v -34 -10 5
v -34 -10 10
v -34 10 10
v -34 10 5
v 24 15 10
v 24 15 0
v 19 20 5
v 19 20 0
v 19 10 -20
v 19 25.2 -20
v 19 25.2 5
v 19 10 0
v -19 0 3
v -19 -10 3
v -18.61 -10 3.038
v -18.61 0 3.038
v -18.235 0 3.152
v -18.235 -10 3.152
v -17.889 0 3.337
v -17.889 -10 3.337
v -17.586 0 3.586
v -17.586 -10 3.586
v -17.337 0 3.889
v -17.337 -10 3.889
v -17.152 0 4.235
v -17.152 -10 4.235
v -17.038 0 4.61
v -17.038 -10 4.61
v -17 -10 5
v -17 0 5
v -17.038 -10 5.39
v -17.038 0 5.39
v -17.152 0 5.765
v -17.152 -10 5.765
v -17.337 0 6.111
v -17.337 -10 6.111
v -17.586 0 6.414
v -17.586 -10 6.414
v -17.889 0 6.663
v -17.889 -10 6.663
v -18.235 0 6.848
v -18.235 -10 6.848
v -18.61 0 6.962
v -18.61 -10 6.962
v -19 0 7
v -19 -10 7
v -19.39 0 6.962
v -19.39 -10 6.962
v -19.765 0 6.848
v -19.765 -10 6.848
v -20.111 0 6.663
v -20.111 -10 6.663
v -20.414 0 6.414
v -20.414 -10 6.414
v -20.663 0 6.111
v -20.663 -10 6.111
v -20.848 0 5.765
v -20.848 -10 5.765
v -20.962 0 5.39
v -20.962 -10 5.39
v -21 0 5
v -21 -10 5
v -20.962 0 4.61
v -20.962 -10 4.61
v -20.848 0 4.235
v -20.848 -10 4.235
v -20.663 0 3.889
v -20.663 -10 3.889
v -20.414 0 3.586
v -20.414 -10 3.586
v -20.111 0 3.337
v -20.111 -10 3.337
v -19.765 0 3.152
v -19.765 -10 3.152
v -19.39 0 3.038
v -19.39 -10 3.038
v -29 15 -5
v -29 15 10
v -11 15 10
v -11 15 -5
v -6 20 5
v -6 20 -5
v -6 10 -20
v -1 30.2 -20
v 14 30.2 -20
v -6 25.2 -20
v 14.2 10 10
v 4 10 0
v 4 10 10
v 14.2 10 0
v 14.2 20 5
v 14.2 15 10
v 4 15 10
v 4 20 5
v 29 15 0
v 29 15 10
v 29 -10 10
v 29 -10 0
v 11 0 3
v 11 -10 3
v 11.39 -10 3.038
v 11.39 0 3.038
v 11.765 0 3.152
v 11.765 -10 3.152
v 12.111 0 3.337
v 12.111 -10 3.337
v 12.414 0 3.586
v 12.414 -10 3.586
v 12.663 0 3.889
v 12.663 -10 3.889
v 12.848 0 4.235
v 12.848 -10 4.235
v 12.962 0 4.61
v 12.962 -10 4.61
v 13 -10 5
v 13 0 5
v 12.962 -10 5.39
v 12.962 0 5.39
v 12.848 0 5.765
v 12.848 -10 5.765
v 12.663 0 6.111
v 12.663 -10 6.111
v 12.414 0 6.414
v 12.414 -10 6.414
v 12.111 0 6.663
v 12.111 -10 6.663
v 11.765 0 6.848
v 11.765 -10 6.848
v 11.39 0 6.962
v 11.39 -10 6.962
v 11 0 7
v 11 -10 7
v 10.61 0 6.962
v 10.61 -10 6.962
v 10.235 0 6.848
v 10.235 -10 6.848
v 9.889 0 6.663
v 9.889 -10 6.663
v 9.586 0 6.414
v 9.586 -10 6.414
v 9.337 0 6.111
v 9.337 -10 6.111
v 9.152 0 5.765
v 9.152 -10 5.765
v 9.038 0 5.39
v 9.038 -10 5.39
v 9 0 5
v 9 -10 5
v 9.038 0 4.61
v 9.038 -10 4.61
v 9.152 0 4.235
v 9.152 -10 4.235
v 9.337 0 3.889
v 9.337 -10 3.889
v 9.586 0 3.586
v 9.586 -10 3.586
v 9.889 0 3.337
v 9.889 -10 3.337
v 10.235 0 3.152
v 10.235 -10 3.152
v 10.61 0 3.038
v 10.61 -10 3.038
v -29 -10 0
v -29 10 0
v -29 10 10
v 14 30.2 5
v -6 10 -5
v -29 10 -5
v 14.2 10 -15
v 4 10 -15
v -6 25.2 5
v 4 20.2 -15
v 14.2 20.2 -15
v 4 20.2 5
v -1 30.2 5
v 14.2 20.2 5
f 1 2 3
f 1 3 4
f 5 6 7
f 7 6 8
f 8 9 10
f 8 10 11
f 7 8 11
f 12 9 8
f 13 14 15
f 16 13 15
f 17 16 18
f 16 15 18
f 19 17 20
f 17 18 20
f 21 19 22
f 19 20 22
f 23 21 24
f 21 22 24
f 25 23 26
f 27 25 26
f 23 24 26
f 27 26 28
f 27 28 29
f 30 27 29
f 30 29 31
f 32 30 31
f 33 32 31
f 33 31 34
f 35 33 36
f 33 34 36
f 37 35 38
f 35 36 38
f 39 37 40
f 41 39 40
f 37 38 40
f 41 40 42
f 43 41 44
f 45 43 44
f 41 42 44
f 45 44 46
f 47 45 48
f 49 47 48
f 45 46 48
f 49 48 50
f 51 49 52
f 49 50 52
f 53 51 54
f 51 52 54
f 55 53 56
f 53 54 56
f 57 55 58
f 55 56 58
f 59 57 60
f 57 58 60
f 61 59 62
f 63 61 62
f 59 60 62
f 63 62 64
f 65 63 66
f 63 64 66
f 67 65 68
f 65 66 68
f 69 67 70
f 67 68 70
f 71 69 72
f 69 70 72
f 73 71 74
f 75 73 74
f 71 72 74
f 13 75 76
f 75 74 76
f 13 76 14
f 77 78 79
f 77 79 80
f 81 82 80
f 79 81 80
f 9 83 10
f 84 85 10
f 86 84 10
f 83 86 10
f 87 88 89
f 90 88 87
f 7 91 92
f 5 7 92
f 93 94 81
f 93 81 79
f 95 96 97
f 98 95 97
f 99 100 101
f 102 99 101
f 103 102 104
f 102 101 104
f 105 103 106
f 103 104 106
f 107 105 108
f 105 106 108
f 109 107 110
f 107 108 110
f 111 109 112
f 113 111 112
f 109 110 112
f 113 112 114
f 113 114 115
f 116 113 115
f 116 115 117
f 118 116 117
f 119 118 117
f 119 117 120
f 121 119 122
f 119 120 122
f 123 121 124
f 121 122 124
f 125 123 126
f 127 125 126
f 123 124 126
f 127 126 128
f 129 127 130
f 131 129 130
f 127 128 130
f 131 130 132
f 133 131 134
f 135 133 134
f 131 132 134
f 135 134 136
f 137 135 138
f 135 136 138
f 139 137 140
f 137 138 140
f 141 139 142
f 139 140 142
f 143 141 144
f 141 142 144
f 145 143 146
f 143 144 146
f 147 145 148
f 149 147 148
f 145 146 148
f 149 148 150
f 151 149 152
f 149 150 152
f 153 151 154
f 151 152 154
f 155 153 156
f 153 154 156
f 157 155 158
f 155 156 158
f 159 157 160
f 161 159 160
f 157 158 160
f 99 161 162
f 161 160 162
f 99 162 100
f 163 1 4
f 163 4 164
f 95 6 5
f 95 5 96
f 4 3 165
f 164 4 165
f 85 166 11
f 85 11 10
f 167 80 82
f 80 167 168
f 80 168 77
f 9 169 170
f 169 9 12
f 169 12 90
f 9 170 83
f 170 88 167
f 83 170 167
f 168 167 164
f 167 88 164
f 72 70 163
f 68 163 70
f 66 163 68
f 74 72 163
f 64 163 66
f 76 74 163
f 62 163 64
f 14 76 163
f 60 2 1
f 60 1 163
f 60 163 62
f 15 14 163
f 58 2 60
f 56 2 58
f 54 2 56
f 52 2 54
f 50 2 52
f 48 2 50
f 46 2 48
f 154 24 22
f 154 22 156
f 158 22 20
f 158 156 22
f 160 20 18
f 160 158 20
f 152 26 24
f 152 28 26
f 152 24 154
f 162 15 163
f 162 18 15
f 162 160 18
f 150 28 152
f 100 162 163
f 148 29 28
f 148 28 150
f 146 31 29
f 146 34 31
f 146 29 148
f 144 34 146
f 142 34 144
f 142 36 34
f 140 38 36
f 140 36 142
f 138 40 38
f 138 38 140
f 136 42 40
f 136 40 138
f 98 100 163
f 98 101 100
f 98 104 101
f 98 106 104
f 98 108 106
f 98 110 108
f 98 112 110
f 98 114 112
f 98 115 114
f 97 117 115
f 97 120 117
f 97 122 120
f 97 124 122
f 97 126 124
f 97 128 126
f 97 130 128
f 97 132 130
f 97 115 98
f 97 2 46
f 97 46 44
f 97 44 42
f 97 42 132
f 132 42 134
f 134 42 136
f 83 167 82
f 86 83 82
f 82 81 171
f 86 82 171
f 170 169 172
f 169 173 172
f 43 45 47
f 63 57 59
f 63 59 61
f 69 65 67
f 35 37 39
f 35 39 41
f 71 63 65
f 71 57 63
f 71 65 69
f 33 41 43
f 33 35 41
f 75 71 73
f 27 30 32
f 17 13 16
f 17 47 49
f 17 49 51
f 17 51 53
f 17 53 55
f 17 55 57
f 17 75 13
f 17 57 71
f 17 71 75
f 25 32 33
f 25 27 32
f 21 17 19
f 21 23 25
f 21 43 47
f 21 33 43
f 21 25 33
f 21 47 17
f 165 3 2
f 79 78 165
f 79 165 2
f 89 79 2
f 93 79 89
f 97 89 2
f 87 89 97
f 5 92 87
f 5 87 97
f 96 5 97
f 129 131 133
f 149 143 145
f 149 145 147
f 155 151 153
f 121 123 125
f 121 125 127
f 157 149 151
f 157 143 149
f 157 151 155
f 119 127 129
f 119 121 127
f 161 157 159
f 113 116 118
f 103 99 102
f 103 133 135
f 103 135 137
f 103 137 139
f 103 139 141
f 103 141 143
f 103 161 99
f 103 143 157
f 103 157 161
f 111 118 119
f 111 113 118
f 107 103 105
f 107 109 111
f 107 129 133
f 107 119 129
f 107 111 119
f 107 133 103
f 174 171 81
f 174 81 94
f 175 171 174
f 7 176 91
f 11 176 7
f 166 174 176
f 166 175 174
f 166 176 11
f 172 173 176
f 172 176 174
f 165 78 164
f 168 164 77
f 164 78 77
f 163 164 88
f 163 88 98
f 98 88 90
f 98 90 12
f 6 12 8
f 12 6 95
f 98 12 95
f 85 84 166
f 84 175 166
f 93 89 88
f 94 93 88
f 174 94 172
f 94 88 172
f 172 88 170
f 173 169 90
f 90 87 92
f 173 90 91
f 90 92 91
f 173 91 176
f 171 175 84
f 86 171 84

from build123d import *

# Parameters (mm, degrees)
SZKIC1_W                        = 58
SZKIC1_H                        = 20
DODANIE_WYCI_GNI_CIE1_DEPTH     = 5
SZKIC2_W                        = 15
SZKIC2_H                        = 5
DODANIE_WYCI_GNI_CIE2_DEPTH     = 58
DODANIE_WYCI_GNI_CIE3_DEPTH     = 20
DODANIE_WYCI_GNI_CIE4_DEPTH     = 10
WYTNIJ_WYCI_GNI_CIE2_DEPTH      = 47.562216442
WYTNIJ_WYCI_GNI_CIE2_DEPTH_BACK = 47.562216442
SZKIC6_W                        = 58
SZKIC6_H                        = 5
DODANIE_WYCI_GNI_CIE5_DEPTH     = 20
SZKIC7_R                        = 2
WYTNIJ_WYCI_GNI_CIE3_DEPTH      = 10
DODANIE_WYCI_GNI_CIE8_DEPTH     = 10
SZKIC11_W                       = 10.2
SZKIC11_H                       = 10.2
DODANIE_WYCI_GNI_CIE9_DEPTH     = 5
SFAZOWANIE2_SIZE                = 5
SFAZOWANIE3_SIZE                = 5
SZKIC12_W                       = 10
SZKIC12_H                       = 20
WYTNIJ_WYCI_GNI_CIE4_DEPTH      = 10


with BuildPart() as part:
    # Szkic1 → Dodanie-wyciągnięcie1 (new body)
    with BuildSketch(Plane.XY):
        Rectangle(SZKIC1_W, SZKIC1_H)
    extrude(amount=DODANIE_WYCI_GNI_CIE1_DEPTH)

    # Szkic2 → Dodanie-wyciągnięcie2 (add)
    with BuildSketch(Plane(origin=(29, 0, 0), x_dir=(0, 0, -1), z_dir=(1, 0, 0))):
        with Locations((-2.5, 12.5)):
            Rectangle(SZKIC2_W, SZKIC2_H)
    extrude(amount=-DODANIE_WYCI_GNI_CIE2_DEPTH)

    # Szkic3 → Dodanie-wyciągnięcie3 (add)
    with BuildSketch(Plane.XZ.offset(10)):
        Polygon((-34, 5), (-29, 0), (-29, 5), (-24, 5), (-29, 10), (-34, 10), align=None)
    extrude(amount=-DODANIE_WYCI_GNI_CIE3_DEPTH)

    # Szkic5 → Dodanie-wyciągnięcie4 (add)
    with BuildSketch(Plane.XY.offset(5)):
        Polygon((14.2, 20.2), (14.2, 10), (19, 10), (19, 30.2), (-6, 30.2), (-6, 10), (4, 10), (4, 20.2), align=None)
    extrude(amount=-DODANIE_WYCI_GNI_CIE4_DEPTH)

    # Szkic5<3> → Wytnij-wyciągnięcie2 (cut, two sides: drawn at the far end of the back side and taken through both)
    with BuildSketch(Plane.XY.offset(5).offset(-WYTNIJ_WYCI_GNI_CIE2_DEPTH_BACK)):
        Polygon((4, 10), (14.2, 10), (14.2, 15), (14.2, 20.2), (4, 20.2), (4, 15), align=None)
    extrude(amount=WYTNIJ_WYCI_GNI_CIE2_DEPTH + WYTNIJ_WYCI_GNI_CIE2_DEPTH_BACK, mode=Mode.SUBTRACT)

    # Szkic6 → Dodanie-wyciągnięcie5 (add)
    with BuildSketch(Plane(origin=(0, 10, 0), x_dir=(1, 0, 0), z_dir=(0, 1, 0))):
        with Locations((0, -7.5)):
            Rectangle(SZKIC6_W, SZKIC6_H)
    extrude(amount=-DODANIE_WYCI_GNI_CIE5_DEPTH)

    # Szkic7 → Wytnij-wyciągnięcie3 (cut)
    with BuildSketch(Plane.XZ.offset(10)):
        with Locations(Location((-19, 5, 0), (0, 0, 270))):
            Circle(SZKIC7_R)
        with Locations(Location((11, 5, 0), (0, 0, 270))):
            Circle(SZKIC7_R)
    extrude(amount=-WYTNIJ_WYCI_GNI_CIE3_DEPTH, mode=Mode.SUBTRACT)

    # Szkic10 → Dodanie-wyciągnięcie8 (add)
    with BuildSketch(Plane(origin=(0, 0, -5), x_dir=(-1, 0, 0), z_dir=(0, 0, -1))):
        Polygon((6, 10), (6, 15), (6, 30.2), (-19, 30.2), (-19, 15), (-29, 15), (-29, 10), (-14.2, 10), (-14.2, 20.2), (-4, 20.2), (-4, 10), align=None)
    extrude(amount=DODANIE_WYCI_GNI_CIE8_DEPTH)

    # Szkic11 → Dodanie-wyciągnięcie9 (add)
    with BuildSketch(Plane(origin=(0, 0, -15), x_dir=(-1, 0, 0), z_dir=(0, 0, -1))):
        with Locations((-9.1, 15.1)):
            Rectangle(SZKIC11_W, SZKIC11_H)
        Polygon((-29, 10), (-14.2, 10), (-14.2, 20.2), (-4, 20.2), (-4, 10), (6, 10), (6, 30.2), (-19, 30.2), (-19, 15), (-29, 15), align=None)
    extrude(amount=DODANIE_WYCI_GNI_CIE9_DEPTH)

    # Sfazowanie2
    sfazowanie2_edges = [part.edges().sort_by_distance(p)[0] for p in [
        (-6, 30.2, -7.5),
        (19, 30.2, -7.5),
    ]]
    chamfer(sfazowanie2_edges, length=SFAZOWANIE2_SIZE)

    # Sfazowanie3
    # the kernel refuses this chamfer: 5 mm, written as the material it adds along each edge
    with BuildSketch(Plane(origin=(1.34158506, 15, 5), x_dir=(0, 0.9996219169112968, -0.027495876610586317), z_dir=(1, 0, 0))) as sfazowanie3_piece_1_section:
        Polygon((SFAZOWANIE3_SIZE * 0.999621916911, SFAZOWANIE3_SIZE * 0.0274958766106), (-SFAZOWANIE3_SIZE * 0.0274958766106, SFAZOWANIE3_SIZE * 0.999621916911), (0, 0), align=None)
    sfazowanie3_piece_1 = extrude(amount=17.65841494, mode=Mode.PRIVATE)
    sfazowanie3_piece_1 = split(sfazowanie3_piece_1, bisect_by=Plane(origin=(4, 16.652020772, 6.643171669), z_dir=(-1, 0, 0)), keep=Keep.TOP, mode=Mode.PRIVATE)
    sfazowanie3_piece_1 = split(sfazowanie3_piece_1, bisect_by=Plane(origin=(2.67079253, 16.652020772, 10), z_dir=(0, 0, -1)), keep=Keep.TOP, mode=Mode.PRIVATE)
    add(sfazowanie3_piece_1)
    with BuildSketch(Plane(origin=(14.2, 15, 5), x_dir=(0, 0.9996219169112968, -0.027495876610586317), z_dir=(1, 0, 0))) as sfazowanie3_piece_2_section:
        Polygon((SFAZOWANIE3_SIZE * 0.999621916911, SFAZOWANIE3_SIZE * 0.0274958766106), (-SFAZOWANIE3_SIZE * 0.0274958766106, SFAZOWANIE3_SIZE * 0.999621916911), (0, 0), align=None)
    sfazowanie3_piece_2 = extrude(amount=4.8, mode=Mode.PRIVATE)
    sfazowanie3_piece_2 = split(sfazowanie3_piece_2, bisect_by=Plane(origin=(16.6, 16.652020772, 10), z_dir=(0, 0, -1)), keep=Keep.TOP, mode=Mode.PRIVATE)
    add(sfazowanie3_piece_2)
    with BuildSketch(Plane(origin=(-6, 15, 5), x_dir=(0, 0.9996219169112968, -0.027495876610586317), z_dir=(1, 0, 0))) as sfazowanie3_piece_3_section:
        Polygon((SFAZOWANIE3_SIZE * 0.999621916911, SFAZOWANIE3_SIZE * 0.0274958766106), (-SFAZOWANIE3_SIZE * 0.0274958766106, SFAZOWANIE3_SIZE * 0.999621916911), (0, 0), align=None)
    sfazowanie3_piece_3 = extrude(amount=10, mode=Mode.PRIVATE)
    sfazowanie3_piece_3 = split(sfazowanie3_piece_3, bisect_by=Plane(origin=(-1, 16.652020772, 10), z_dir=(0, 0, -1)), keep=Keep.TOP, mode=Mode.PRIVATE)
    add(sfazowanie3_piece_3)
    with BuildSketch(Plane(origin=(-6, 15, 5), x_dir=(0, 0.9996219169112968, -0.027495876610586317), z_dir=(1, 0, 0))) as sfazowanie3_piece_4_section:
        Polygon((SFAZOWANIE3_SIZE * 0.999621916911, SFAZOWANIE3_SIZE * 0.0274958766106), (-SFAZOWANIE3_SIZE * 0.0274958766106, SFAZOWANIE3_SIZE * 0.999621916911), (0, 0), align=None)
    sfazowanie3_piece_4 = extrude(amount=22.85841494, mode=Mode.PRIVATE)
    sfazowanie3_piece_4 = split(sfazowanie3_piece_4, bisect_by=Plane(origin=(14.2, 16.652020772, 6.643171669), z_dir=(1, 0, 0)), keep=Keep.TOP, mode=Mode.PRIVATE)
    sfazowanie3_piece_4 = split(sfazowanie3_piece_4, bisect_by=Plane(origin=(15.52920747, 16.652020772, 10), z_dir=(0, 0, -1)), keep=Keep.TOP, mode=Mode.PRIVATE)
    add(sfazowanie3_piece_4)
    with BuildSketch(Plane(origin=(-6, 15, -5), x_dir=(0.027495876610586837, 0.9996219169112968, 0), z_dir=(0, 0, 1))) as sfazowanie3_piece_5:
        Polygon((SFAZOWANIE3_SIZE * 0.999621916911, SFAZOWANIE3_SIZE * 0.0274958766106), (-SFAZOWANIE3_SIZE * 0.0274958766106, SFAZOWANIE3_SIZE * 0.999621916911), (0, 0), align=None)
    extrude(amount=10)
    with BuildSketch(Plane(origin=(19, 15, -20), x_dir=(0.9996219169112968, -0.027495876610586664, 0), z_dir=(0, 0, 1))) as sfazowanie3_piece_6:
        Polygon((SFAZOWANIE3_SIZE * 0.999621916911, SFAZOWANIE3_SIZE * 0.0274958766106), (-SFAZOWANIE3_SIZE * 0.0274958766106, SFAZOWANIE3_SIZE * 0.999621916911), (0, 0), align=None)
    extrude(amount=25)
    with BuildSketch(Plane(origin=(14.2, 15, 5), x_dir=(0, 0.9996219169112968, -0.027495876610586317), z_dir=(1, 0, 0))) as sfazowanie3_piece_7a_section:
        Polygon((SFAZOWANIE3_SIZE * 0.999621916911, SFAZOWANIE3_SIZE * 0.0274958766106), (-SFAZOWANIE3_SIZE * 0.0274958766106, SFAZOWANIE3_SIZE * 0.999621916911), (0, 0), align=None)
    sfazowanie3_piece_7a = extrude(amount=17.65841494, mode=Mode.PRIVATE)
    sfazowanie3_piece_7a = split(sfazowanie3_piece_7a, bisect_by=Plane(origin=(19, 16.652020772, 6.643171669), z_dir=(1, 0, 0)), keep=Keep.TOP, mode=Mode.PRIVATE)
    sfazowanie3_piece_7a = split(sfazowanie3_piece_7a, bisect_by=Plane(origin=(24, 16.652020772, 10), z_dir=(0, 0, -1)), keep=Keep.TOP, mode=Mode.PRIVATE)
    sfazowanie3_piece_7a = split(sfazowanie3_piece_7a, bisect_by=Plane(origin=(29, 16.652020772, 6.643171669), z_dir=(-1, 0, 0)), keep=Keep.TOP, mode=Mode.PRIVATE)
    with BuildSketch(Plane(origin=(19, 15, -20), x_dir=(0.9996219169112968, -0.027495876610586664, 0), z_dir=(0, 0, 1))) as sfazowanie3_piece_7b_section:
        Polygon((SFAZOWANIE3_SIZE * 0.999621916911, SFAZOWANIE3_SIZE * 0.0274958766106), (-SFAZOWANIE3_SIZE * 0.0274958766106, SFAZOWANIE3_SIZE * 0.999621916911), (0, 0), align=None)
    sfazowanie3_piece_7b = extrude(amount=37.85841494, mode=Mode.PRIVATE)
    sfazowanie3_piece_7b = split(sfazowanie3_piece_7b, bisect_by=Plane(origin=(20.648968134, 16.648968134, 5), z_dir=(0, 0, 1)), keep=Keep.TOP, mode=Mode.PRIVATE)
    sfazowanie3_piece_7b = split(sfazowanie3_piece_7b, bisect_by=Plane(origin=(20.648968134, 16.648968134, 10), z_dir=(0, 0, -1)), keep=Keep.TOP, mode=Mode.PRIVATE)
    sfazowanie3_piece_7 = sfazowanie3_piece_7a & sfazowanie3_piece_7b
    add(sfazowanie3_piece_7)
    with BuildSketch(Plane(origin=(-6, 15, -5), x_dir=(0.027495876610586837, 0.9996219169112968, 0), z_dir=(0, 0, 1))) as sfazowanie3_piece_8a_section:
        Polygon((SFAZOWANIE3_SIZE * 0.999621916911, SFAZOWANIE3_SIZE * 0.0274958766106), (-SFAZOWANIE3_SIZE * 0.0274958766106, SFAZOWANIE3_SIZE * 0.999621916911), (0, 0), align=None)
    sfazowanie3_piece_8a = extrude(amount=22.85841494, mode=Mode.PRIVATE)
    sfazowanie3_piece_8a = split(sfazowanie3_piece_8a, bisect_by=Plane(origin=(-7.648968134, 16.648968134, 5), z_dir=(0, 0, 1)), keep=Keep.TOP, mode=Mode.PRIVATE)
    sfazowanie3_piece_8a = split(sfazowanie3_piece_8a, bisect_by=Plane(origin=(-7.648968134, 16.648968134, 10), z_dir=(0, 0, -1)), keep=Keep.TOP, mode=Mode.PRIVATE)
    with BuildSketch(Plane(origin=(-18.85841494, 15, 5), x_dir=(0, 0.9996219169112968, -0.027495876610586317), z_dir=(1, 0, 0))) as sfazowanie3_piece_8b_section:
        Polygon((SFAZOWANIE3_SIZE * 0.999621916911, SFAZOWANIE3_SIZE * 0.0274958766106), (-SFAZOWANIE3_SIZE * 0.0274958766106, SFAZOWANIE3_SIZE * 0.999621916911), (0, 0), align=None)
    sfazowanie3_piece_8b = extrude(amount=22.85841494, mode=Mode.PRIVATE)
    sfazowanie3_piece_8b = split(sfazowanie3_piece_8b, bisect_by=Plane(origin=(-6, 16.652020772, 6.643171669), z_dir=(-1, 0, 0)), keep=Keep.TOP, mode=Mode.PRIVATE)
    sfazowanie3_piece_8b = split(sfazowanie3_piece_8b, bisect_by=Plane(origin=(-12.42920747, 16.652020772, 10), z_dir=(0, 0, -1)), keep=Keep.TOP, mode=Mode.PRIVATE)
    sfazowanie3_piece_8 = sfazowanie3_piece_8a & sfazowanie3_piece_8b
    add(sfazowanie3_piece_8)

    # Szkic12 → Wytnij-wyciągnięcie4 (cut)
    with BuildSketch(Plane.XZ.offset(-10)):
        with Locations((24, -10)):
            Rectangle(SZKIC12_W, SZKIC12_H)
    extrude(amount=-WYTNIJ_WYCI_GNI_CIE4_DEPTH, mode=Mode.SUBTRACT)


solid = part.part
